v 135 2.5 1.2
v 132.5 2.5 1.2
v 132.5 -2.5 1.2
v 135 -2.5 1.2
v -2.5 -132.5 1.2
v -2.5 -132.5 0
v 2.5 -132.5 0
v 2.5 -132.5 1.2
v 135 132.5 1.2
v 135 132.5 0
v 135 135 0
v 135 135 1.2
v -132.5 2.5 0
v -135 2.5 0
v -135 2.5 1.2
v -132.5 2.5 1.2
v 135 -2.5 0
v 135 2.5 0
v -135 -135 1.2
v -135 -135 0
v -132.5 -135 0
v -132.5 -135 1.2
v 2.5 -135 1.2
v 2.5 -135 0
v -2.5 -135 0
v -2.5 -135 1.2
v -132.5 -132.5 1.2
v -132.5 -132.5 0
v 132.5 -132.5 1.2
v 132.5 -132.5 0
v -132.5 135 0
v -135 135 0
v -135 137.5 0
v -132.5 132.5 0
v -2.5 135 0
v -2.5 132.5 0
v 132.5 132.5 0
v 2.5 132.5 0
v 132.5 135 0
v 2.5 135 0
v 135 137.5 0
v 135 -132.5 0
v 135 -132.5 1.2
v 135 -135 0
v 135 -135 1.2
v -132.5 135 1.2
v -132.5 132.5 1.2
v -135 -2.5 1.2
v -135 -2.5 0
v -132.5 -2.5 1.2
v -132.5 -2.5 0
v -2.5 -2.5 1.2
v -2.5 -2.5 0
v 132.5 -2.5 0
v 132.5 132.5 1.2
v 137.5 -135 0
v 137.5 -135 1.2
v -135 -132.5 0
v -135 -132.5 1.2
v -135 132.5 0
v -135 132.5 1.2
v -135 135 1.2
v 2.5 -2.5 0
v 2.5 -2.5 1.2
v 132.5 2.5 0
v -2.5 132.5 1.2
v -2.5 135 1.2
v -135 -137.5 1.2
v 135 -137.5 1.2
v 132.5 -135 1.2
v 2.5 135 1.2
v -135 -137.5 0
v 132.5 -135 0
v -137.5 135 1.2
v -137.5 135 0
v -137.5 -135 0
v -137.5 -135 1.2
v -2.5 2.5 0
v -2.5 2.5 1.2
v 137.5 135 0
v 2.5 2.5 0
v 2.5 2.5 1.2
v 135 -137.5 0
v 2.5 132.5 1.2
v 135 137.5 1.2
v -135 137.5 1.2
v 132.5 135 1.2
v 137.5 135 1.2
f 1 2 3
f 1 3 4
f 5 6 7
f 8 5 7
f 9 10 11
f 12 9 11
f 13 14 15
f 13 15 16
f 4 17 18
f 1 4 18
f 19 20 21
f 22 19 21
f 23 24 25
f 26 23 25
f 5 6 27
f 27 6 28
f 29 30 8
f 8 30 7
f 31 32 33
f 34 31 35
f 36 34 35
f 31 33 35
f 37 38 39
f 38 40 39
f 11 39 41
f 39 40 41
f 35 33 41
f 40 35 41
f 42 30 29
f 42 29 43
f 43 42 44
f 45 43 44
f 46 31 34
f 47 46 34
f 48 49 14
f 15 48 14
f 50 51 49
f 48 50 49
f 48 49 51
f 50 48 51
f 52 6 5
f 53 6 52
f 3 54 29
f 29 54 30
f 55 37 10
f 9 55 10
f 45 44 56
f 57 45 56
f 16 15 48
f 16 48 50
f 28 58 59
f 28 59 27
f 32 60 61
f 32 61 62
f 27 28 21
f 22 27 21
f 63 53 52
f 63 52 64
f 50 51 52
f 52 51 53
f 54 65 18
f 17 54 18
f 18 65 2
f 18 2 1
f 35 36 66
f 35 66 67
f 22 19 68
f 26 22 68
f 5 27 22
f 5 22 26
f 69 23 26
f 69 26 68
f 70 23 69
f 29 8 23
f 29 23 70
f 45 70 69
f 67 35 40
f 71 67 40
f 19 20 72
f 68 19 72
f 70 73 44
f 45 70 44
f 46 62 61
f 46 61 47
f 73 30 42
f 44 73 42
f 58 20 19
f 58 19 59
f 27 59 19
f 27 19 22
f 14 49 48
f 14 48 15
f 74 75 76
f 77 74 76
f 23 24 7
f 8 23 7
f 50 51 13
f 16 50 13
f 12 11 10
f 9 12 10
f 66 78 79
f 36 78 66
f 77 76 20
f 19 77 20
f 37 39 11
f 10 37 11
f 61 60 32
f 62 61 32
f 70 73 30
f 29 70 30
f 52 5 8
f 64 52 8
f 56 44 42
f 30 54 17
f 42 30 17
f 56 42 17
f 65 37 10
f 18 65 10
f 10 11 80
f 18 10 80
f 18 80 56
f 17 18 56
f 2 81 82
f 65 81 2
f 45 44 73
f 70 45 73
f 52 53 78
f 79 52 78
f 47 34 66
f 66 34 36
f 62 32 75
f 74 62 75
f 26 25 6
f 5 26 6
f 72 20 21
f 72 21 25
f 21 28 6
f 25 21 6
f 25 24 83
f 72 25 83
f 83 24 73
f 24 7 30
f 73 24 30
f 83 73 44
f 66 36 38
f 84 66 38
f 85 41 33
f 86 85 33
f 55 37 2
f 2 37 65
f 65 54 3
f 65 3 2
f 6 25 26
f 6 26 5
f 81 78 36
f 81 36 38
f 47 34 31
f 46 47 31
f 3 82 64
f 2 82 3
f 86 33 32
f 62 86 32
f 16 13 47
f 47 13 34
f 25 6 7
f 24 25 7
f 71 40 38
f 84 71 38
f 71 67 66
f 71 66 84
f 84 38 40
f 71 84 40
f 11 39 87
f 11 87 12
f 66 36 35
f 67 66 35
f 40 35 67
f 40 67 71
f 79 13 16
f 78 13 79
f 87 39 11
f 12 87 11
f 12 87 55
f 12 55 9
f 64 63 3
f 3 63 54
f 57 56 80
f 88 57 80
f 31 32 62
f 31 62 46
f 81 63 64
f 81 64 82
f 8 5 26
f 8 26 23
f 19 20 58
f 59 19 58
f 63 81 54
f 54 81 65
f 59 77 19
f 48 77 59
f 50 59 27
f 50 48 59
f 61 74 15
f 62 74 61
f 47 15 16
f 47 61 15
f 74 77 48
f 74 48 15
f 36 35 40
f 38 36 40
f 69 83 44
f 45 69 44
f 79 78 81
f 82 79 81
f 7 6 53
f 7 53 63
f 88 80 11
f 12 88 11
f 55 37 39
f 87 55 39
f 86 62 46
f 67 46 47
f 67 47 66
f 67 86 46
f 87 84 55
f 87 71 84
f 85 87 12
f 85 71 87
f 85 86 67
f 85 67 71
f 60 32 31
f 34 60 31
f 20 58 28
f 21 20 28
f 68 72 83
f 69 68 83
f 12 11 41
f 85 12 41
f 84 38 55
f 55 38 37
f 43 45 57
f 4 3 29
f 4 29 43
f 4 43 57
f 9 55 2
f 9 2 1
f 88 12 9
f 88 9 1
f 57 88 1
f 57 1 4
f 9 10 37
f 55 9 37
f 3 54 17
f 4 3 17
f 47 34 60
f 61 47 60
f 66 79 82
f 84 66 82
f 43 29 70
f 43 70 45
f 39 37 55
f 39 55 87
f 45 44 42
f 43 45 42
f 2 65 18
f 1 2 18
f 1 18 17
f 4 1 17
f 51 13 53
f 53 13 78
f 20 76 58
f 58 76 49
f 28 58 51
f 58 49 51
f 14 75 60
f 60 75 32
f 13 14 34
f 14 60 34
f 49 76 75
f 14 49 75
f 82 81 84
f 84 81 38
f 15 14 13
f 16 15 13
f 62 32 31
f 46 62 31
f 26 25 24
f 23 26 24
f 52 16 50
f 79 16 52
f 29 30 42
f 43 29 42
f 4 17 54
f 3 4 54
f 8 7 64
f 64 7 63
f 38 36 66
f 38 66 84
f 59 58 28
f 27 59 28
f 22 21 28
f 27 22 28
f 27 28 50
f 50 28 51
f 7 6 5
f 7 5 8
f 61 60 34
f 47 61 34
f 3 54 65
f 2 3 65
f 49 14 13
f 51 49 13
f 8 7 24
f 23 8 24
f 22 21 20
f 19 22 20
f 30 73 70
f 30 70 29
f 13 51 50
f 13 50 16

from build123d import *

# Parameters (mm, degrees)
F0_W     = 2.5
F0_H     = 2.5
F1_DEPTH = 1.2
F0_W_2   = 5
F0_H_2   = 5
F2_DEPTH = 1.2
F0_W_3   = 130
F0_H_3   = 130


with BuildPart() as f1:
    # F0 (on Top) → F1 (new body)
    with BuildSketch(Plane.XY):
        with Locations((133.75, 133.75)):
            Rectangle(F0_W, F0_H)
    extrude(amount=F1_DEPTH)


with BuildPart() as f1b:
    # F0 (on Top) → F1, piece 2 (new body)
    with BuildSketch(Plane.XY):
        with Locations((-133.75, 133.75)):
            Rectangle(F0_W, F0_H)
    extrude(amount=F1_DEPTH)


with BuildPart() as f1c:
    # F0 (on Top) → F1, piece 3 (new body)
    with BuildSketch(Plane.XY):
        with Locations((-133.75, -133.75)):
            Rectangle(F0_W, F0_H)
    extrude(amount=F1_DEPTH)


with BuildPart() as f1d:
    # F0 (on Top) → F1, piece 4 (new body)
    with BuildSketch(Plane.XY):
        with Locations((133.75, -133.75)):
            Rectangle(F0_W, F0_H)
    extrude(amount=F1_DEPTH)


with BuildPart() as f1e:
    # F0 (on Top) → F1, piece 5 (new body)
    with BuildSketch(Plane.XY):
        with Locations((0, -133.75)):
            Rectangle(F0_W_2, F0_H)
    extrude(amount=F1_DEPTH)


with BuildPart() as f1f:
    # F0 (on Top) → F1, piece 6 (new body)
    with BuildSketch(Plane.XY):
        with Locations((133.75, 0)):
            Rectangle(F0_W, F0_H_2)
    extrude(amount=F1_DEPTH)


with BuildPart() as f1g:
    # F0 (on Top) → F1, piece 7 (new body)
    with BuildSketch(Plane.XY):
        with Locations((-133.75, 0)):
            Rectangle(F0_W, F0_H_2)
    extrude(amount=F1_DEPTH)


with BuildPart() as f1h:
    # F0 (on Top) → F1, piece 8 (new body)
    with BuildSketch(Plane.XY):
        with Locations((0, 133.75)):
            Rectangle(F0_W_2, F0_H)
    extrude(amount=F1_DEPTH)


with BuildPart() as f2:
    # F0 (on Top) → F2 (new body)
    with BuildSketch(Plane.XY):
        Polygon((-132.5, -132.5), (-132.5, -2.5), (-135, -2.5), (-135, 2.5), (-132.5, 2.5), (-132.5, 132.5), (-135, 132.5), (-135, 135), (-137.5, 135), (-137.5, -135), (-135, -135), (-135, -132.5), align=None)
    extrude(amount=F2_DEPTH)


with BuildPart() as f2b:
    # F0 (on Top) → F2, piece 2 (new body)
    with BuildSketch(Plane.XY):
        with Locations((-67.5, 0)):
            Rectangle(F0_W_3, F0_H_2)
    extrude(amount=F2_DEPTH)


with BuildPart() as f2c:
    # F0 (on Top) → F2, piece 3 (new body)
    with BuildSketch(Plane.XY):
        with Locations((0, 67.5)):
            Rectangle(F0_W_2, F0_H_3)
    extrude(amount=F2_DEPTH)


with BuildPart() as f2d:
    # F0 (on Top) → F2, piece 4 (new body)
    with BuildSketch(Plane.XY):
        Polygon((2.5, 132.5), (132.5, 132.5), (132.5, 135), (135, 135), (135, 137.5), (-135, 137.5), (-135, 135), (-132.5, 135), (-132.5, 132.5), (-2.5, 132.5), (-2.5, 135), (2.5, 135), align=None)
    extrude(amount=F2_DEPTH)


with BuildPart() as f2e:
    # F0 (on Top) → F2, piece 5 (new body)
    with BuildSketch(Plane.XY):
        Polygon((135, 2.5), (135, -2.5), (132.5, -2.5), (132.5, -132.5), (135, -132.5), (135, -135), (137.5, -135), (137.5, 135), (135, 135), (135, 132.5), (132.5, 132.5), (132.5, 2.5), align=None)
    extrude(amount=F2_DEPTH)


with BuildPart() as f2f:
    # F0 (on Top) → F2, piece 6 (new body)
    with BuildSketch(Plane.XY):
        Polygon((132.5, -135), (132.5, -132.5), (2.5, -132.5), (2.5, -135), (-2.5, -135), (-2.5, -132.5), (-132.5, -132.5), (-132.5, -135), (-135, -135), (-135, -137.5), (135, -137.5), (135, -135), align=None)
    extrude(amount=F2_DEPTH)


with BuildPart() as f2g:
    # F0 (on Top) → F2, piece 7 (new body)
    with BuildSketch(Plane.XY):
        with Locations((67.5, 0)):
            Rectangle(F0_W_3, F0_H_2)
    extrude(amount=F2_DEPTH)


with BuildPart() as f2h:
    # F0 (on Top) → F2, piece 8 (new body)
    with BuildSketch(Plane.XY):
        with Locations((0, -67.5)):
            Rectangle(F0_W_2, F0_H_3)
    extrude(amount=F2_DEPTH)


solid = Compound([f1.part, f1b.part, f1c.part, f1d.part, f1e.part, f1f.part, f1g.part, f1h.part, f2.part, f2b.part, f2c.part, f2d.part, f2e.part, f2f.part, f2g.part, f2h.part])
